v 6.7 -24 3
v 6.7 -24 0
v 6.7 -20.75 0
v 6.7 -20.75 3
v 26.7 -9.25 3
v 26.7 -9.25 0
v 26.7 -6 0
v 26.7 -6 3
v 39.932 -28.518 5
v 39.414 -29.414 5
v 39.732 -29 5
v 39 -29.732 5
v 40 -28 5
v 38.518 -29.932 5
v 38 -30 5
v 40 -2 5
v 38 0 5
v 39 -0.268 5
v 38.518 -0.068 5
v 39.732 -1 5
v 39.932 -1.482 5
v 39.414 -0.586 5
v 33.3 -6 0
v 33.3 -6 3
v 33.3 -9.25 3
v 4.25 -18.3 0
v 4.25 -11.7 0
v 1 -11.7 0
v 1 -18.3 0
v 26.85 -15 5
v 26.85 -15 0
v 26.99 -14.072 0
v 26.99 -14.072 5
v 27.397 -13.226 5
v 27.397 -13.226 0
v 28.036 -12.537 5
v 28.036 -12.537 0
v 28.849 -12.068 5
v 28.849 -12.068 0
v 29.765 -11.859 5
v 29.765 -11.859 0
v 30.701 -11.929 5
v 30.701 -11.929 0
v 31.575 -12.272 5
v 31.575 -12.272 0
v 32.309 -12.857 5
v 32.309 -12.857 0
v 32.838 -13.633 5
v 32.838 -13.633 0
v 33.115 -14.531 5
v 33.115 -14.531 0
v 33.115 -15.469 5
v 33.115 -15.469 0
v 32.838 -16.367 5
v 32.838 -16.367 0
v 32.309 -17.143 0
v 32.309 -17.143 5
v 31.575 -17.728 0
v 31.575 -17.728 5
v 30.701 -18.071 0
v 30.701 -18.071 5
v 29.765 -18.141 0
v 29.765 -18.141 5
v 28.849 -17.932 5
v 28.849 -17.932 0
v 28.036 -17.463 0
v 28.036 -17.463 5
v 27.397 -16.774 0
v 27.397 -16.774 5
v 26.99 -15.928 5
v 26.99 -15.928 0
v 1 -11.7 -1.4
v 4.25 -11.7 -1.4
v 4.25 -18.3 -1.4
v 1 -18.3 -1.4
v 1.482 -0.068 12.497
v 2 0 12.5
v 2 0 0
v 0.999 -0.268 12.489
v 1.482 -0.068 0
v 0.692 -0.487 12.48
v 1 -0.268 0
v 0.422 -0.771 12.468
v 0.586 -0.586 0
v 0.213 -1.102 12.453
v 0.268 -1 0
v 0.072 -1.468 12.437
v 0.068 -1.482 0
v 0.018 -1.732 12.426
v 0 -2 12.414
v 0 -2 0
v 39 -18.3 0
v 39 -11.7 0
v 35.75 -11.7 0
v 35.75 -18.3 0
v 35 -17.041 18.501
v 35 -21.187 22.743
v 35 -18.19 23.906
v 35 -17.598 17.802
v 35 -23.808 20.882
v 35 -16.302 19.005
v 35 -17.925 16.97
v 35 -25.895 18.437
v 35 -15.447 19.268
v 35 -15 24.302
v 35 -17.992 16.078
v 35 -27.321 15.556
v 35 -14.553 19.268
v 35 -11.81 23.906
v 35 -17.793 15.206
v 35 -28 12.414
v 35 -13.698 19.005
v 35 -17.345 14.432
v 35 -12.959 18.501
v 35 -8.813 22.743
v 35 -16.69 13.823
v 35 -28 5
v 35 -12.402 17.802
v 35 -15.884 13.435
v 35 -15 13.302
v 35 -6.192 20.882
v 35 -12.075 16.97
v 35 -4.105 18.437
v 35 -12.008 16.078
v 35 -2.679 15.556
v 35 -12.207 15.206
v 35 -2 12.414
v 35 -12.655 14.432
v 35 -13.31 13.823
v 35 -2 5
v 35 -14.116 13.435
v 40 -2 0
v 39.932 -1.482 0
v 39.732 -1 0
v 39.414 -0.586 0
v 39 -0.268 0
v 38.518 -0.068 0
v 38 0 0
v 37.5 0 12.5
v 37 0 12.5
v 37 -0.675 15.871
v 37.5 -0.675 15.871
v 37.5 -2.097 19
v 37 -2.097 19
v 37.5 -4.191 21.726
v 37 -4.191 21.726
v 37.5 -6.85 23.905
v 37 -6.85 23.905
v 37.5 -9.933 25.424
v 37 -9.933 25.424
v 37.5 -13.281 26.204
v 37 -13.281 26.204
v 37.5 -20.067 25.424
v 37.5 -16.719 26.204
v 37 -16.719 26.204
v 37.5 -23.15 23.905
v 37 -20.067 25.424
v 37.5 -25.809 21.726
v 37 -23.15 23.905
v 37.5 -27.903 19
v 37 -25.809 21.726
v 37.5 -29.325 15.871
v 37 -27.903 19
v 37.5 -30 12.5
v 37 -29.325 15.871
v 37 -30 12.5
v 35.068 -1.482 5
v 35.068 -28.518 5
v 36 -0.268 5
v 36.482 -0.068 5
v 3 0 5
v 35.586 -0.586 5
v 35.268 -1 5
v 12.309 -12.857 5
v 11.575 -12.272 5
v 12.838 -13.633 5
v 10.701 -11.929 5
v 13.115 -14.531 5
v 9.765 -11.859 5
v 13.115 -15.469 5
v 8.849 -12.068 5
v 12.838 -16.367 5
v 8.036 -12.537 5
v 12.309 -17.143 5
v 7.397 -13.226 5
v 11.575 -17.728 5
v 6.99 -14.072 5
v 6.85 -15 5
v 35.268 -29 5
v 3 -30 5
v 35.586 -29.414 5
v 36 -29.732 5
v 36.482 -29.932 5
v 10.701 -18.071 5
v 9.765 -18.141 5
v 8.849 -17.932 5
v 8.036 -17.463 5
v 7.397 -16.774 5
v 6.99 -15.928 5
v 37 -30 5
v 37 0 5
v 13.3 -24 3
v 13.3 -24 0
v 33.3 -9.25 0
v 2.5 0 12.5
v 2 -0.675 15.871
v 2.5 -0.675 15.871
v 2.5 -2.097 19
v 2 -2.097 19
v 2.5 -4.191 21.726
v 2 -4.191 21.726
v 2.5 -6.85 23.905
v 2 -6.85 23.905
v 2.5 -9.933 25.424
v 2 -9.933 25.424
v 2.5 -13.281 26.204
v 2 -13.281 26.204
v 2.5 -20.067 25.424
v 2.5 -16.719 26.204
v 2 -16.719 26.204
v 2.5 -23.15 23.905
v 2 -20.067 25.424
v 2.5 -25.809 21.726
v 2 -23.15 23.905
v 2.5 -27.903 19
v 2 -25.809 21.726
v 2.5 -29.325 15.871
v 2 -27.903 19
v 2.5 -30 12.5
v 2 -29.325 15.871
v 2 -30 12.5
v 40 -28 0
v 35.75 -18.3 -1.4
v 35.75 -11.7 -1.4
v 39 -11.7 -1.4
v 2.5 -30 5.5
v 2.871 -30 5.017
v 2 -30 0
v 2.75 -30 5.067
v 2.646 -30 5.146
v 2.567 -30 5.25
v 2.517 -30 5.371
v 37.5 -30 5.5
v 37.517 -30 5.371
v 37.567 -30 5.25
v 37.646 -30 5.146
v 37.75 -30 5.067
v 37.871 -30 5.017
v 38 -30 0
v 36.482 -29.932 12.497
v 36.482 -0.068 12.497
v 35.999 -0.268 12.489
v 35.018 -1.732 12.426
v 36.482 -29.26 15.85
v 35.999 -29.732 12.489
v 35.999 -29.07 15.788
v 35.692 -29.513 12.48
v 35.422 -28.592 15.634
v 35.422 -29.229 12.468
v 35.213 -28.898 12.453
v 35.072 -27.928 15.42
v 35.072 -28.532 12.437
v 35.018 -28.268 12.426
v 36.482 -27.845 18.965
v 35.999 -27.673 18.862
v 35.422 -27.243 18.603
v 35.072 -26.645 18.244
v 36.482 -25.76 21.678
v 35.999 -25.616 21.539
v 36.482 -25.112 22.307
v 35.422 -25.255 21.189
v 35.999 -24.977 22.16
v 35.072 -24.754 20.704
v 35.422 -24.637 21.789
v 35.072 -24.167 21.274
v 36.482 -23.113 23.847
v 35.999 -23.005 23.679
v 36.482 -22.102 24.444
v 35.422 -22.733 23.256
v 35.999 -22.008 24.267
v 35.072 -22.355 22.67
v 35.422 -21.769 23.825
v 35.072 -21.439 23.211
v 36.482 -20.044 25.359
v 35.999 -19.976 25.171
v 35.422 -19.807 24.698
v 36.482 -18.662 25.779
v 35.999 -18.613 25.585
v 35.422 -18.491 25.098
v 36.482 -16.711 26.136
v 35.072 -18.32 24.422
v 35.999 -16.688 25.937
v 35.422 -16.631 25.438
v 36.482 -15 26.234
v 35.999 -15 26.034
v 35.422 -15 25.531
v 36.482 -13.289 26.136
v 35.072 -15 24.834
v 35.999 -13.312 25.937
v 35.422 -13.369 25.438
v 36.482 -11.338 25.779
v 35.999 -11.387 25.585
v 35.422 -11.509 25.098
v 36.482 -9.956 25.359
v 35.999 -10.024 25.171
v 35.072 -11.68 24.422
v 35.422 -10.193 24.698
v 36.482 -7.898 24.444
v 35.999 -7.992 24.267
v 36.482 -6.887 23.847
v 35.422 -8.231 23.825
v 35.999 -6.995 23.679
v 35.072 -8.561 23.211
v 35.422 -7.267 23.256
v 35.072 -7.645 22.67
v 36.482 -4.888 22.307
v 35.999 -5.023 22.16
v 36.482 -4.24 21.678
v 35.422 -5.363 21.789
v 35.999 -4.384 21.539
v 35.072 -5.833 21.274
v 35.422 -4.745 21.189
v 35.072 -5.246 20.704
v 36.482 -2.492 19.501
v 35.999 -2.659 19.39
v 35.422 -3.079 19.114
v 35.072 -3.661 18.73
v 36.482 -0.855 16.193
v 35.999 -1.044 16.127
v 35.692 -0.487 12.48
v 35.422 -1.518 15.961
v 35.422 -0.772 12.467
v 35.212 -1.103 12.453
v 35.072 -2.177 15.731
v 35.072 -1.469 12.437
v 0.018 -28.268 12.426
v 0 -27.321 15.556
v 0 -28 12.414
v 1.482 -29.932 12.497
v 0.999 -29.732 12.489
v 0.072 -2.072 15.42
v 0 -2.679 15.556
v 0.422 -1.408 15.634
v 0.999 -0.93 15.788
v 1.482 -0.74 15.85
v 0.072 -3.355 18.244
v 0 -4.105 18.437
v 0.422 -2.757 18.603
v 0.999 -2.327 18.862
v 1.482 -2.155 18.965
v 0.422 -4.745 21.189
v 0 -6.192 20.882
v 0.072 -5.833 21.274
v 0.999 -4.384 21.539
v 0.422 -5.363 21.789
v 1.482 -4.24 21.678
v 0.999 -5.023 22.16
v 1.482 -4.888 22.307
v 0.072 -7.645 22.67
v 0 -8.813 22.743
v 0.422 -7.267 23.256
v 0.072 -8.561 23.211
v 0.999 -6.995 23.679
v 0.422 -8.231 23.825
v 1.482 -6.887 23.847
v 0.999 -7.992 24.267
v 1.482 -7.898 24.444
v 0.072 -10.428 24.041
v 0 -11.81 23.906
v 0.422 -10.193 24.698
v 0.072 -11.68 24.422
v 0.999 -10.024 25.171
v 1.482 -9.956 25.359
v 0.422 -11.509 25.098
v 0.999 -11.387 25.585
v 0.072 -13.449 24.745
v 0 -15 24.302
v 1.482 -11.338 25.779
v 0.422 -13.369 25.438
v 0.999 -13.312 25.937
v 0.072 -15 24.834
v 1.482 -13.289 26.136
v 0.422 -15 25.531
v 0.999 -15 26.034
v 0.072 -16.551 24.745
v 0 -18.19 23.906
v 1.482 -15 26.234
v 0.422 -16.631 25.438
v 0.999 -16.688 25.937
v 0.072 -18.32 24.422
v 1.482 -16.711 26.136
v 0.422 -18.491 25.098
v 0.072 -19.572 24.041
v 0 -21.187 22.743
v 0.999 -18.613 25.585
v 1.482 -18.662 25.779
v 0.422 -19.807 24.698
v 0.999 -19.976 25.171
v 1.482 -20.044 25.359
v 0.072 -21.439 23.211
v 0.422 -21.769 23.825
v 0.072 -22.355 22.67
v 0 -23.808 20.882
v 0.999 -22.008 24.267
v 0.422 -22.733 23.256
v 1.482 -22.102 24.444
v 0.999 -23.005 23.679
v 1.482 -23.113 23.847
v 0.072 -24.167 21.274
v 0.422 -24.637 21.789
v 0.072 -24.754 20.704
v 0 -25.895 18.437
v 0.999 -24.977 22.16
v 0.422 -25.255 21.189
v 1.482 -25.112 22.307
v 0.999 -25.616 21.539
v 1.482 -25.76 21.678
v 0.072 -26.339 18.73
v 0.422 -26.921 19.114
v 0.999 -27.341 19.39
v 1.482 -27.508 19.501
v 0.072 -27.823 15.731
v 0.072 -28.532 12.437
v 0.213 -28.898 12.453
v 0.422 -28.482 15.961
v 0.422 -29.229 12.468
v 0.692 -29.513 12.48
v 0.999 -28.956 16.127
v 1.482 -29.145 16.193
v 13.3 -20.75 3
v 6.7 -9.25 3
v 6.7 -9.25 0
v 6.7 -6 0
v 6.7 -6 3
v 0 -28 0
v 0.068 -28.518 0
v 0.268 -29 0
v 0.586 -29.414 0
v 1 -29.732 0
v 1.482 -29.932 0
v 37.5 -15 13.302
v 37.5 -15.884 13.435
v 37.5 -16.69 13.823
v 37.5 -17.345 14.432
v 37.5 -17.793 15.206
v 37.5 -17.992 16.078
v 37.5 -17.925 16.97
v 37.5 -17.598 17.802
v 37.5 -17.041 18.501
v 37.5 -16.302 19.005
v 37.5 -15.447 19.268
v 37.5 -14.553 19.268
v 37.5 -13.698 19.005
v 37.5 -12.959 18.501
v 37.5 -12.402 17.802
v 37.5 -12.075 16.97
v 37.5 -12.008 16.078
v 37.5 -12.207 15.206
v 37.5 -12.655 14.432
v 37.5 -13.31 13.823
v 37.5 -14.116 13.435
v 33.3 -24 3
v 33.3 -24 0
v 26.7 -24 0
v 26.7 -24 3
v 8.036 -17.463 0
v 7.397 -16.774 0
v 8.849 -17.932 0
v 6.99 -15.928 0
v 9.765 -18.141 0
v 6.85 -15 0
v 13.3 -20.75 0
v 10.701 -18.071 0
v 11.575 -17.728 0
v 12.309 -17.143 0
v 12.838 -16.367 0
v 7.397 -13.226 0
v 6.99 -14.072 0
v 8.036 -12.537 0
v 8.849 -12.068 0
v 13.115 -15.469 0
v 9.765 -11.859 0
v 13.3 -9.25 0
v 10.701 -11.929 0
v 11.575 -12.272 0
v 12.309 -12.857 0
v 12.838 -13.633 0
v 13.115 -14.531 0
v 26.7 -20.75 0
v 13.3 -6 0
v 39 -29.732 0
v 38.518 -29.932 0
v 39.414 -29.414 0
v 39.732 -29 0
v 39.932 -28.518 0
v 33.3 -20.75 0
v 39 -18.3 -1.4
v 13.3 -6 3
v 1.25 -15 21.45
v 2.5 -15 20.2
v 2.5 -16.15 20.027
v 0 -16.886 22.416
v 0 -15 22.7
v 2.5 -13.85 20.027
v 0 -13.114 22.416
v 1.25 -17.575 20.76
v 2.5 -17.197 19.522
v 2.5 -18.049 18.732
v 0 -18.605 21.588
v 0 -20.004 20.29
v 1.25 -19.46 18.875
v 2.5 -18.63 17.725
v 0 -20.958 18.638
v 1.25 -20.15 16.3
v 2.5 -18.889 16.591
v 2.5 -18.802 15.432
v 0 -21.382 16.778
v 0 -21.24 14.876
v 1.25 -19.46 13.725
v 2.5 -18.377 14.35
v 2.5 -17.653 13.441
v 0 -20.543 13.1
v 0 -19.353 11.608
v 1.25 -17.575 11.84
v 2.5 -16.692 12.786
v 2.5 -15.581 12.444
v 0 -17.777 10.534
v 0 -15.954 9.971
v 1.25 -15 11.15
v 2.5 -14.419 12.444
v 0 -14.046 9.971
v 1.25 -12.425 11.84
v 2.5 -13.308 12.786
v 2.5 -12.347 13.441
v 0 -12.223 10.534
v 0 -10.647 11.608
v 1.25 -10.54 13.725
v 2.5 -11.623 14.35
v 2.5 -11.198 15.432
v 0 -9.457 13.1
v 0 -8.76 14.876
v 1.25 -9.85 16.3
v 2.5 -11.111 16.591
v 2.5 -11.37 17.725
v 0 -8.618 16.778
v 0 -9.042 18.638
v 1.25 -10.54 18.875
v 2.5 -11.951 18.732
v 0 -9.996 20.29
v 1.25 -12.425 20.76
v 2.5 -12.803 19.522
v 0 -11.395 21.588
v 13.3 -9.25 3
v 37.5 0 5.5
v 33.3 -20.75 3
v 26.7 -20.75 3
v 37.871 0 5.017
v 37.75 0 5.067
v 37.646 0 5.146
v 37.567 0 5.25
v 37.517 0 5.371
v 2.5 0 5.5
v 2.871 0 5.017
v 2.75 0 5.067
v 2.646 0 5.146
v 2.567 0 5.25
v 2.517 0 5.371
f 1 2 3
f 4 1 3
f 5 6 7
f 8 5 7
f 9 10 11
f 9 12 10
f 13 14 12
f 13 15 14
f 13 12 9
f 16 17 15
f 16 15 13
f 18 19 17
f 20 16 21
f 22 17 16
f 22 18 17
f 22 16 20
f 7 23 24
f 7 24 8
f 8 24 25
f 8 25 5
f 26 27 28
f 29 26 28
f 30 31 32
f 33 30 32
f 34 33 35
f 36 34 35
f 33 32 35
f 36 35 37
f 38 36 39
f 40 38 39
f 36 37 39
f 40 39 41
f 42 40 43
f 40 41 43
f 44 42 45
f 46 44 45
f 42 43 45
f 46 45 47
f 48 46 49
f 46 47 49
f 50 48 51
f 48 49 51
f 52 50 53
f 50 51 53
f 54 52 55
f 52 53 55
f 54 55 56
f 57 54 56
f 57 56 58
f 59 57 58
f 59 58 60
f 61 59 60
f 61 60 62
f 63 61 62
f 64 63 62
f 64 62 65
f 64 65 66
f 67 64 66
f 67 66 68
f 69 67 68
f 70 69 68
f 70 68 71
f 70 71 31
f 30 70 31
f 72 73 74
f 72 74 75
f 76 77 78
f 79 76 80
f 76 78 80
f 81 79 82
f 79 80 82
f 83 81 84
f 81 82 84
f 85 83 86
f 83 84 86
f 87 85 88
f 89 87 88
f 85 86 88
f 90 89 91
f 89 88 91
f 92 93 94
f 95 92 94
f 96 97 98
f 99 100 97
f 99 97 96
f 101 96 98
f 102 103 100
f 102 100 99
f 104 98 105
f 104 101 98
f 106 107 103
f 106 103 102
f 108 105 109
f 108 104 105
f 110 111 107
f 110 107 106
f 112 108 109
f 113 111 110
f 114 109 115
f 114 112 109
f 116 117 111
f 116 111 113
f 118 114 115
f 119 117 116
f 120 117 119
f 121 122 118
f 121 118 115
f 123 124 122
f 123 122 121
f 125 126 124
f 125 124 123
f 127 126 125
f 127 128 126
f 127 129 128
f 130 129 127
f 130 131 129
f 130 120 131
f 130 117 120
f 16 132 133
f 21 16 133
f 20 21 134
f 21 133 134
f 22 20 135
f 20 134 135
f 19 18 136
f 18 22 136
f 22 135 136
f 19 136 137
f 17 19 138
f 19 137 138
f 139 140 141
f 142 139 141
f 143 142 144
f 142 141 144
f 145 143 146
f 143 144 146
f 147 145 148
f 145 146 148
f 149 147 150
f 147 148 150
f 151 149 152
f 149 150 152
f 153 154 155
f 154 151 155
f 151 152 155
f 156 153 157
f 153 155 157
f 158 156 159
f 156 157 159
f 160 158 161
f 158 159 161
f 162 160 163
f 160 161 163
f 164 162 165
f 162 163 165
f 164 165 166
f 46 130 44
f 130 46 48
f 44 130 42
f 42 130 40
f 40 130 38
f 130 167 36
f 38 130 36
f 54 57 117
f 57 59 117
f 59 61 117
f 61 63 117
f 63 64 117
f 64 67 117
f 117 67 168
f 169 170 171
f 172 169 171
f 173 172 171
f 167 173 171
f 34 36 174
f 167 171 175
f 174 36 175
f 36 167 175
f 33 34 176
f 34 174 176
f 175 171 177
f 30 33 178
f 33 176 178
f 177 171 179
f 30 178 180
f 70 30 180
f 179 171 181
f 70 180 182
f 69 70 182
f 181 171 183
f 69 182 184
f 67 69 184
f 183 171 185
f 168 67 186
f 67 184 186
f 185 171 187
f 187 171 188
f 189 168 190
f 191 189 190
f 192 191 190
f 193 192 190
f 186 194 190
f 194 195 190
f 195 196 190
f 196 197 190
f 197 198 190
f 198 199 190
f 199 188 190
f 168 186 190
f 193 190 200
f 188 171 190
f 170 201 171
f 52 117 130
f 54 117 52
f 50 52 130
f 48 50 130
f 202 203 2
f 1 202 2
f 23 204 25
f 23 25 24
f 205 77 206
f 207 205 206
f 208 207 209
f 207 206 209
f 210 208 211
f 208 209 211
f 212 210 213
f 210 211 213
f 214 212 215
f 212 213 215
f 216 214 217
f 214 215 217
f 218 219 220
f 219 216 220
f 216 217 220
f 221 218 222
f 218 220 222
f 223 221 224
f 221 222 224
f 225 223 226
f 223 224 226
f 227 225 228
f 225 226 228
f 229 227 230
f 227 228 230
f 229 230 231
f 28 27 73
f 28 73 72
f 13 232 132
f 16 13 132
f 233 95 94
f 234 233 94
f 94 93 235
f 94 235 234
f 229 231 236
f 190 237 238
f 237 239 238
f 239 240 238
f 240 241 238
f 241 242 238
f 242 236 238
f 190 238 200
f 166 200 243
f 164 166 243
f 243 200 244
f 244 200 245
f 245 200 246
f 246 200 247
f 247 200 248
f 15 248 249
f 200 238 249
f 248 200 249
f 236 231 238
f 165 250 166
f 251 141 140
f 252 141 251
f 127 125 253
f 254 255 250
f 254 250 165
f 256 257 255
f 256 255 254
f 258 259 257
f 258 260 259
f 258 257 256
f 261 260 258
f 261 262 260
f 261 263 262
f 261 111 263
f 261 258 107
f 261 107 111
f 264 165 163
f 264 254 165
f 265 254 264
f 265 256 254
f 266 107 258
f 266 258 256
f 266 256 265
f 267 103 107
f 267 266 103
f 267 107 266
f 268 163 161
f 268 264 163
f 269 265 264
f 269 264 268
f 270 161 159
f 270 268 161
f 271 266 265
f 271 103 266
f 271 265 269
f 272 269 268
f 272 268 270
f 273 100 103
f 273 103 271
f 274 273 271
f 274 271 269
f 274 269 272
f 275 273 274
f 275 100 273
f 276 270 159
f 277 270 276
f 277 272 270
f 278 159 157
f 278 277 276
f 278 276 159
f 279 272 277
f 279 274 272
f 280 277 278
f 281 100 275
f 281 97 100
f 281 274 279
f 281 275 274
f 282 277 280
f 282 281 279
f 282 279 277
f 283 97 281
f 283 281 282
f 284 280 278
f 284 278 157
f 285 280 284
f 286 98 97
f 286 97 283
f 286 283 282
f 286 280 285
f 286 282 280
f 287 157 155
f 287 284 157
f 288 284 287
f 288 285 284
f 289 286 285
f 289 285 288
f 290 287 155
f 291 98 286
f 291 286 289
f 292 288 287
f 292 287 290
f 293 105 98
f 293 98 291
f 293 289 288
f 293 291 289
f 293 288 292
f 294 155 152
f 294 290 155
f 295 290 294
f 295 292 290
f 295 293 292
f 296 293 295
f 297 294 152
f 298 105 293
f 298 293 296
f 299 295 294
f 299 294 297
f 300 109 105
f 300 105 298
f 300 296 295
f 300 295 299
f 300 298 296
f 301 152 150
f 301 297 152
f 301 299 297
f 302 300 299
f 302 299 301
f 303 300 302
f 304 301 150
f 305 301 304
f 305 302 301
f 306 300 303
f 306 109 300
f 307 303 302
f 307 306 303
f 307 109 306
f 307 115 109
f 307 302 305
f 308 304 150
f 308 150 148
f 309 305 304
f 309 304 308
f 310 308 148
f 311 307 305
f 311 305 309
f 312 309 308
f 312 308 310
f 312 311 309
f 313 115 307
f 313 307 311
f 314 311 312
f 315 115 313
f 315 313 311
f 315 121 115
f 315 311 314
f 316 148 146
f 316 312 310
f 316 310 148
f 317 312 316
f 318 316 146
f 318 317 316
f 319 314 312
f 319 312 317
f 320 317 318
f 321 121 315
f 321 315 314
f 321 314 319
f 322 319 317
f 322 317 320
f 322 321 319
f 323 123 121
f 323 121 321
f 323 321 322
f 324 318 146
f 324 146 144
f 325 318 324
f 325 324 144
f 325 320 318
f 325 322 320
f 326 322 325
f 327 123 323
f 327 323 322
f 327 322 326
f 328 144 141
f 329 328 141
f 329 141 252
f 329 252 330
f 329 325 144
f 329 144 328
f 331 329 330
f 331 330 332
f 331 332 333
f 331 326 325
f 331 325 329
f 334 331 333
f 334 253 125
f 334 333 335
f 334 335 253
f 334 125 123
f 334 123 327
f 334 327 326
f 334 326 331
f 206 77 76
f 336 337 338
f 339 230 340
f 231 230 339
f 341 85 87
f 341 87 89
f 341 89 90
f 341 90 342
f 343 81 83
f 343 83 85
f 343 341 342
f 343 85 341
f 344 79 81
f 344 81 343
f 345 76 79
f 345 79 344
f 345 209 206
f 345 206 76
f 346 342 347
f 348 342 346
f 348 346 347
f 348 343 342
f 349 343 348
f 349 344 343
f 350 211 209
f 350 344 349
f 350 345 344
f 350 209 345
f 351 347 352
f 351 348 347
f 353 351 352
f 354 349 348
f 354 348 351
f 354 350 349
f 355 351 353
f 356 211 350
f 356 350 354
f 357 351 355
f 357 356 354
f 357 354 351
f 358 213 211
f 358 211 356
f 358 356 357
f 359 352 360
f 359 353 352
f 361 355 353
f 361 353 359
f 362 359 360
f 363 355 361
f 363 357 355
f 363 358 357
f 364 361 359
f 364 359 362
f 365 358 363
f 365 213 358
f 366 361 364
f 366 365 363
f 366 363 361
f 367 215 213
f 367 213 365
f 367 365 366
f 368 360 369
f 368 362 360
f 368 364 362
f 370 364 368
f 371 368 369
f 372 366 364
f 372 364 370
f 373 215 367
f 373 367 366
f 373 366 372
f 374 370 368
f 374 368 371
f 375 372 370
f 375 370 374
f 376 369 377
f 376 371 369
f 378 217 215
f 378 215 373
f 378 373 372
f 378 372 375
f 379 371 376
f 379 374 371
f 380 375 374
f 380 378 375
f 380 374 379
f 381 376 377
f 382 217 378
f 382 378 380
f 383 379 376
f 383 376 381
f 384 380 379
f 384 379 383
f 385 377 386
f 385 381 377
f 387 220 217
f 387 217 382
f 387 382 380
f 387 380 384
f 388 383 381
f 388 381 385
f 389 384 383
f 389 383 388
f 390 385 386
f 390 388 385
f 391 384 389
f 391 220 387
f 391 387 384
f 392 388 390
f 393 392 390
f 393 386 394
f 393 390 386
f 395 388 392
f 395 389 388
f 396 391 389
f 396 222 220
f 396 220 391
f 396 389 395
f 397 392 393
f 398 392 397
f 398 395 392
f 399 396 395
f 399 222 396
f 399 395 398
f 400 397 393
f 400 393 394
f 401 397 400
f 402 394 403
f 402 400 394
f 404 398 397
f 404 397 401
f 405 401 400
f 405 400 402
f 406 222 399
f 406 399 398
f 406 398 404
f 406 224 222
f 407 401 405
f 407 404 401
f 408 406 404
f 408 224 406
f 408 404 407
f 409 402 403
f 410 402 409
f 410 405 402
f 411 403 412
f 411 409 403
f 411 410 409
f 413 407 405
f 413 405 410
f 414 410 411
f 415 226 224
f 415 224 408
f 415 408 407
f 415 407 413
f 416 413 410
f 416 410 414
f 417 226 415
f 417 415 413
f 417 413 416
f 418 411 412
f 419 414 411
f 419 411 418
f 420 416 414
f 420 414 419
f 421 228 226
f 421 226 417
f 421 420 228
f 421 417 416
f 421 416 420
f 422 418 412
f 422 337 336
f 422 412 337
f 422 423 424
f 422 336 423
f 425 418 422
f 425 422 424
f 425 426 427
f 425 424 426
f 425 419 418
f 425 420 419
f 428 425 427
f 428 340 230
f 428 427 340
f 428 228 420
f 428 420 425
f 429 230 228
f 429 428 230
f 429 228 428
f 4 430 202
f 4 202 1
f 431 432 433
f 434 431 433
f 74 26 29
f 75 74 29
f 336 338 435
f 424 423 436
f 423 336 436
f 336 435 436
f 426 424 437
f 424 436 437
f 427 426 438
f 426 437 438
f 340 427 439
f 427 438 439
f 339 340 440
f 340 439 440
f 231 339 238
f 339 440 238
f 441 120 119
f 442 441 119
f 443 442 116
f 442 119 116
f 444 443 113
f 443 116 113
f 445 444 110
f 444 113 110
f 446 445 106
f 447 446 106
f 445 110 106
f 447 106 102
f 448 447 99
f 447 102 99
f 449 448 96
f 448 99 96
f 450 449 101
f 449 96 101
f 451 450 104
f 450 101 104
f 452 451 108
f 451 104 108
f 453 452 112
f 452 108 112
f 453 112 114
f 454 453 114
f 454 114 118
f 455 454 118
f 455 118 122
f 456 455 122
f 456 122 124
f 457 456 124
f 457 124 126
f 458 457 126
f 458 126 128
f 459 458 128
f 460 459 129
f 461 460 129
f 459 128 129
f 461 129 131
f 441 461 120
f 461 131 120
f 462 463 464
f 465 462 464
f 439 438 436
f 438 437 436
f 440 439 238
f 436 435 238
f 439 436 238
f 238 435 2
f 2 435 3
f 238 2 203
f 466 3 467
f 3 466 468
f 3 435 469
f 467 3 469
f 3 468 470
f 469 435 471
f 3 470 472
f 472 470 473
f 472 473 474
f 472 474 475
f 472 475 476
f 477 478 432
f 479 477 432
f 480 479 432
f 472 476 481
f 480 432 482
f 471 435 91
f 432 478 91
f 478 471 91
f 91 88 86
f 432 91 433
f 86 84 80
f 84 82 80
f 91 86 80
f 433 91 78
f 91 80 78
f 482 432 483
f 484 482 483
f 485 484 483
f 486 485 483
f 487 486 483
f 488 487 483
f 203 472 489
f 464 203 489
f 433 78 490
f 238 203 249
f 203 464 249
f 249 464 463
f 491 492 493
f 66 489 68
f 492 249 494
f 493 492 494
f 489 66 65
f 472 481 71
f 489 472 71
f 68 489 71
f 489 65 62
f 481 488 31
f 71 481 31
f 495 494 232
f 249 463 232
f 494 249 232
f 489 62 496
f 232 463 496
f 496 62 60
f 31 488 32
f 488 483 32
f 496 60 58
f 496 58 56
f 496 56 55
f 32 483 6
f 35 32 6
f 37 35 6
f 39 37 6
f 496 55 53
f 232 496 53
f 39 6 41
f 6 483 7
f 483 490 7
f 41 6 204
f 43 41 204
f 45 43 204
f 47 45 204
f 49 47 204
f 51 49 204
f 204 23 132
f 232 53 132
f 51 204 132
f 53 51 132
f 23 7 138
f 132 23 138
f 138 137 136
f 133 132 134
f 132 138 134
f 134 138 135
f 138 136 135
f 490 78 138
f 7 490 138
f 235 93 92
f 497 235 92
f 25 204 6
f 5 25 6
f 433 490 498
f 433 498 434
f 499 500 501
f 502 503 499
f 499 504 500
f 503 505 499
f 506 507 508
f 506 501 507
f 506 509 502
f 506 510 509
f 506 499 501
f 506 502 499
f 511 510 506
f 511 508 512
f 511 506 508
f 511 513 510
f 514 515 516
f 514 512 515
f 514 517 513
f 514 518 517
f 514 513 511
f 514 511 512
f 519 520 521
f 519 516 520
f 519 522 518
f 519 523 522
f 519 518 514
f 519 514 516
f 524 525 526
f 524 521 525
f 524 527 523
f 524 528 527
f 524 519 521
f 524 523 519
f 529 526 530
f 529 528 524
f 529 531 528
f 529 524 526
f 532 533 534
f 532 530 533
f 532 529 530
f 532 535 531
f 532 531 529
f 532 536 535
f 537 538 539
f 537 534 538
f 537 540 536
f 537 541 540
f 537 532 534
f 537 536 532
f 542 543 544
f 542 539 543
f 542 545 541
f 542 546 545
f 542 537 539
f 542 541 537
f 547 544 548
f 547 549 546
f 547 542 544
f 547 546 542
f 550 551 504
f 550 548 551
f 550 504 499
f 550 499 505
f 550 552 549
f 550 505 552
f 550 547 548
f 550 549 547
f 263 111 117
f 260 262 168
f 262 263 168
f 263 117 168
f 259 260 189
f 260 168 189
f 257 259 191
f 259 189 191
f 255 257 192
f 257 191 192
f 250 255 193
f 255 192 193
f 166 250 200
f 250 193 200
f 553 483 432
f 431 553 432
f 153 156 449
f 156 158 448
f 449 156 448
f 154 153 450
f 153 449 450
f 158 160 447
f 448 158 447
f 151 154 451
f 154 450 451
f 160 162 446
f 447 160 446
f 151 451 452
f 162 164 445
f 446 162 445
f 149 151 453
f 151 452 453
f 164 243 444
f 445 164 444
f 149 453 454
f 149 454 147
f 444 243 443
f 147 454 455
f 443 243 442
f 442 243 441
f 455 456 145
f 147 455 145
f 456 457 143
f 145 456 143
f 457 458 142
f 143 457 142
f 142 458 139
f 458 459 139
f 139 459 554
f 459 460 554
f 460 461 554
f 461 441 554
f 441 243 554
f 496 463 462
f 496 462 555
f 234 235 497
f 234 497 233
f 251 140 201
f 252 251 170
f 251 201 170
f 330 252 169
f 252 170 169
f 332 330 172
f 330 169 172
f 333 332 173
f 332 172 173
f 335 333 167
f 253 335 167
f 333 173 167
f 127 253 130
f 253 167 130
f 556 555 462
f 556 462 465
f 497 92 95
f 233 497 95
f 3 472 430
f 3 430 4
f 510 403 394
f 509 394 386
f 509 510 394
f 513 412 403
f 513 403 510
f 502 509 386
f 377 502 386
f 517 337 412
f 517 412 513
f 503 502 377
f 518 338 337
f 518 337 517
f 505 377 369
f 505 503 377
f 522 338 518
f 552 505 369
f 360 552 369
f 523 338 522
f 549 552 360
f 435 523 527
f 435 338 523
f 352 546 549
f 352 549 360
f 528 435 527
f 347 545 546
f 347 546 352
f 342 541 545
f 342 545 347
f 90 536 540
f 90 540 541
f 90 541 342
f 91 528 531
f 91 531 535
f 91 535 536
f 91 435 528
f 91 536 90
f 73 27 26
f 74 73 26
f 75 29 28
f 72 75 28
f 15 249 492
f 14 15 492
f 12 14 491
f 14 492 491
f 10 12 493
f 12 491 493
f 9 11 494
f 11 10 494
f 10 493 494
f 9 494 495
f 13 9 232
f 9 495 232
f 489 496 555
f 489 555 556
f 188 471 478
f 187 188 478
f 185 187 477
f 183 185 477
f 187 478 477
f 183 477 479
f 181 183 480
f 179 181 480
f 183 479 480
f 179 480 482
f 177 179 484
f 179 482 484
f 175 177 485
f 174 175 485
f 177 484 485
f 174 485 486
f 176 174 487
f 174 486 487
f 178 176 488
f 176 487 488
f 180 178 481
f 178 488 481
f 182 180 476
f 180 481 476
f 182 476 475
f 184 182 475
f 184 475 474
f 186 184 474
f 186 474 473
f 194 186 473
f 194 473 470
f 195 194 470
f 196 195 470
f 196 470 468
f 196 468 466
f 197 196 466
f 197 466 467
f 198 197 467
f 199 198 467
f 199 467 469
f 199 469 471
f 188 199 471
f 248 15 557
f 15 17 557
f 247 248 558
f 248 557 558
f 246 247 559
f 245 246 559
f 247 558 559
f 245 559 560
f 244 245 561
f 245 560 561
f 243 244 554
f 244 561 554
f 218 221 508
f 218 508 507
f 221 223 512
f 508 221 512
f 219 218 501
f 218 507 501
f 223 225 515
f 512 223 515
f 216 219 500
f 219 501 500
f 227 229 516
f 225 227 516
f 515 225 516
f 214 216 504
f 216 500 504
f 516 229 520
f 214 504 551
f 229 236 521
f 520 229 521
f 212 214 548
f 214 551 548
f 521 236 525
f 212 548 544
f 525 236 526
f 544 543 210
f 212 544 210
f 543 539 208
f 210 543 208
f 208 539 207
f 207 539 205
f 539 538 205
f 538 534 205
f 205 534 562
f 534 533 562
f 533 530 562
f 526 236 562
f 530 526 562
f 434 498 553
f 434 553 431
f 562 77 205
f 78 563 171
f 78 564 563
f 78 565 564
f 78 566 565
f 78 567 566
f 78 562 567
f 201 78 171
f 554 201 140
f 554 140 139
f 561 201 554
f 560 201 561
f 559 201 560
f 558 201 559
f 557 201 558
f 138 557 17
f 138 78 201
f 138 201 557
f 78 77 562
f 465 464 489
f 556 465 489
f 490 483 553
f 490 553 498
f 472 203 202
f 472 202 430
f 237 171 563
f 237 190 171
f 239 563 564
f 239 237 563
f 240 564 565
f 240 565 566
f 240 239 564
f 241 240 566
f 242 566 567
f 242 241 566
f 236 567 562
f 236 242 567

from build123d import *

# Parameters (mm, degrees)
SKETCH_1_W          = 40
SKETCH_1_H          = 30
EXTRUDE_1_DEPTH     = 5
SKETCH_2_W          = 2.5
SKETCH_2_H          = 30
EXTRUDE_2_DEPTH     = 27.5
SKETCH_3_W          = 6.6
SKETCH_3_H          = 3.25
CUT_EXTRUDE_1_DEPTH = 3
CUT_EXTRUDE_2_DEPTH = 58.063561053
SKETCH_3_4_W        = 3.25
SKETCH_3_4_H        = 3.3
EXTRUDE_3_DEPTH     = 1.4
SKETCH_4_W          = 2.5
SKETCH_4_H          = 30
EXTRUDE_4_DEPTH     = 22.5
CUT_EXTRUDE_3_DEPTH = 58.063561053
SKETCH_8_W          = 3
SKETCH_8_H          = 2.501
FILLET_3_R          = 0.5
FILLET_4_R          = 2


with BuildPart() as part:
    # 草图1 → 凸台-拉伸1 (new body)
    with BuildSketch(Plane.XY):
        with Locations((20, -15)):
            Rectangle(SKETCH_1_W, SKETCH_1_H)
    extrude(amount=EXTRUDE_1_DEPTH)

    # 草图2 → 凸台-拉伸2 (add)
    with BuildSketch(Plane.XY):
        with Locations((1.25, -15)):
            Rectangle(SKETCH_2_W, SKETCH_2_H)
    extrude(amount=EXTRUDE_2_DEPTH)

    # 草图3 → 切除-拉伸1 (cut)
    with BuildSketch(Plane(origin=(0, 0, 0), x_dir=(-1, 0, 0), z_dir=(0, 0, -1))):
        with Locations((-30, -7.625)):
            Rectangle(SKETCH_3_W, SKETCH_3_H)
        with Locations((-30, -22.375)):
            Rectangle(SKETCH_3_W, SKETCH_3_H)
        with Locations((-10, -22.375)):
            Rectangle(SKETCH_3_W, SKETCH_3_H)
        with Locations((-10, -7.625)):
            Rectangle(SKETCH_3_W, SKETCH_3_H)
    extrude(amount=-CUT_EXTRUDE_1_DEPTH, mode=Mode.SUBTRACT)

    # 草图3<3> → 切除-拉伸2 (cut, through all)
    with BuildSketch(Plane(origin=(0, 0, 0), x_dir=(-1, 0, 0), z_dir=(0, 0, -1))):
        with BuildLine():
            ThreePointArc((-33.15, -15), (-30, -18.15), (-26.85, -15))
            Line((-26.85, -15), (-33.15, -15))
        make_face()
        with BuildLine():
            Line((-33.15, -15), (-26.85, -15))
            ThreePointArc((-26.85, -15), (-30, -11.85), (-33.15, -15))
        make_face()
        with BuildLine():
            ThreePointArc((-13.15, -15), (-10, -18.15), (-6.85, -15))
            Line((-6.85, -15), (-13.15, -15))
        make_face()
        with BuildLine():
            Line((-13.15, -15), (-6.85, -15))
            ThreePointArc((-6.85, -15), (-10, -11.85), (-13.15, -15))
        make_face()
    extrude(amount=-CUT_EXTRUDE_2_DEPTH, mode=Mode.SUBTRACT)

    # 草图4 → 凸台-拉伸4 (add)
    with BuildSketch(Plane.XY.offset(5)):
        with Locations((36.25, -15)):
            Rectangle(SKETCH_4_W, SKETCH_4_H)
    extrude(amount=EXTRUDE_4_DEPTH)

    # 草图5 → 切除-拉伸3 (cut, through all)
    with BuildSketch(Plane.ZY):
        with BuildLine():
            Line((27.5, 0), (12.5, 0))
            ThreePointArc((12.5, 0), (26.301993223, -15), (12.5, -30))
            Line((12.5, -30), (27.5, -30))
            Line((27.5, -30), (27.5, 0))
        make_face()
    extrude(amount=-CUT_EXTRUDE_3_DEPTH, mode=Mode.SUBTRACT)

    # 草图8 → Hole Wizard M6 _1 (revolve, cut)
    with BuildSketch(Plane(origin=(37.5, -15, 16.301993223), x_dir=(0, 0, -1), z_dir=(0, 1, 0))):
        with Locations((1.5, 1.2505)):
            Rectangle(SKETCH_8_W, SKETCH_8_H)
    revolve(axis=Axis((43.85, -15, 16.301993223), (-1, 0, 0)), mode=Mode.SUBTRACT)

    # 草图10 → Hole Wizard M6 _1 2 (revolve, cut)
    with BuildSketch(Plane(origin=(0, -15, 16.3), x_dir=(0, 0, 1), z_dir=(0, 1, 0))):
        Polygon((0, 0), (0, 2.501), (3.3, 2.501), (3.3, 3.1), (6.4, 0), align=None)
    revolve(axis=Axis((-6.35, -15, 16.3), (1, 0, 0)), mode=Mode.SUBTRACT)

    # 圆角3
    fillet_3_edges = [part.edges().sort_by_distance(p)[0] for p in [
        (2.5, -15, 5),
        (37.5, -15, 5),
    ]]
    fillet(fillet_3_edges, radius=FILLET_3_R)

    # 圆角4
    # the kernel refuses this fillet: 2 mm, written as the material it takes off along each edge
    with BuildSketch(Plane(origin=(35, -30, 5), x_dir=(0, 1, 0), z_dir=(0, 0, 1)), Plane(origin=(35, 0, 5), x_dir=(1, 0, 0), z_dir=(0, 0, 1))) as fillet_4_piece_1:
        with BuildLine():
            CenterArc((FILLET_4_R, -FILLET_4_R), FILLET_4_R, 90, 90)
            Line((0, -FILLET_4_R), (-FILLET_4_R * 0.02, -FILLET_4_R))
            Line((-FILLET_4_R * 0.02, -FILLET_4_R), (-FILLET_4_R * 0.02, FILLET_4_R * 0.02))
            Line((-FILLET_4_R * 0.02, FILLET_4_R * 0.02), (FILLET_4_R, FILLET_4_R * 0.02))
            Line((FILLET_4_R, FILLET_4_R * 0.02), (FILLET_4_R, 0))
        make_face()
    extrude(amount=9.5, mode=Mode.SUBTRACT)
    with BuildSketch(Plane(origin=(0, 0, -2), x_dir=(1, 0, 0), z_dir=(0, 0, 1)), Plane(origin=(0, -30, -2), x_dir=(0, 1, 0), z_dir=(0, 0, 1))) as fillet_4_piece_2:
        with BuildLine():
            CenterArc((FILLET_4_R, -FILLET_4_R), FILLET_4_R, 90, 90)
            Line((0, -FILLET_4_R), (-FILLET_4_R * 0.02, -FILLET_4_R))
            Line((-FILLET_4_R * 0.02, -FILLET_4_R), (-FILLET_4_R * 0.02, FILLET_4_R * 0.02))
            Line((-FILLET_4_R * 0.02, FILLET_4_R * 0.02), (FILLET_4_R, FILLET_4_R * 0.02))
            Line((FILLET_4_R, FILLET_4_R * 0.02), (FILLET_4_R, 0))
        make_face()
    extrude(amount=16.5, mode=Mode.SUBTRACT)
    with BuildSketch(Plane(origin=(35, -15, 11.25), x_dir=(0, -0.998754097024609, -0.04990244158914389), z_dir=(0, 0.04990244158914389, -0.998754097024609))) as fillet_4_piece_3:
        with BuildLine():
            CenterArc((15.051993223 - FILLET_4_R, -FILLET_4_R), FILLET_4_R, 0, 90)
            Line((15.051993223 - FILLET_4_R, 0), (15.051993223 - FILLET_4_R, FILLET_4_R * 0.02))
            Line((15.051993223 - FILLET_4_R, FILLET_4_R * 0.02), (15.051993223 + FILLET_4_R * 0.02, FILLET_4_R * 0.02))
            Line((15.051993223 + FILLET_4_R * 0.02, FILLET_4_R * 0.02), (15.051993223 + FILLET_4_R * 0.02, -FILLET_4_R))
            Line((15.051993223 + FILLET_4_R * 0.02, -FILLET_4_R), (15.051993223, -FILLET_4_R))
        make_face()
    revolve(axis=Axis((35, -15, 11.25), (-1, 0, 0)), revolution_arc=185.720774622, mode=Mode.SUBTRACT)
    with BuildSketch(Plane(origin=(0, -15, 11.25), x_dir=(0, 0.9987540970246119, -0.04990244158908723), z_dir=(0, -0.04990244158908723, -0.9987540970246119))) as fillet_4_piece_4:
        with BuildLine():
            CenterArc((15.051993223 - FILLET_4_R, FILLET_4_R), FILLET_4_R, 270, 90)
            Line((15.051993223, FILLET_4_R), (15.051993223 + FILLET_4_R * 0.02, FILLET_4_R))
            Line((15.051993223 + FILLET_4_R * 0.02, FILLET_4_R), (15.051993223 + FILLET_4_R * 0.02, -FILLET_4_R * 0.02))
            Line((15.051993223 + FILLET_4_R * 0.02, -FILLET_4_R * 0.02), (15.051993223 - FILLET_4_R, -FILLET_4_R * 0.02))
            Line((15.051993223 - FILLET_4_R, -FILLET_4_R * 0.02), (15.051993223 - FILLET_4_R, 0))
        make_face()
    revolve(axis=Axis((0, -15, 11.25), (1, 0, 0)), revolution_arc=185.720774622, mode=Mode.SUBTRACT)
    with BuildSketch(Plane(origin=(40, 0, -2), x_dir=(-1, 0, 0), z_dir=(0, 0, 1)), Plane(origin=(40, -30, -2), x_dir=(0, 1, 0), z_dir=(0, 0, 1))) as fillet_4_piece_5:
        with BuildLine():
            CenterArc((FILLET_4_R, FILLET_4_R), FILLET_4_R, 180, 90)
            Line((0, FILLET_4_R), (-FILLET_4_R * 0.02, FILLET_4_R))
            Line((-FILLET_4_R * 0.02, FILLET_4_R), (-FILLET_4_R * 0.02, -FILLET_4_R * 0.02))
            Line((-FILLET_4_R * 0.02, -FILLET_4_R * 0.02), (FILLET_4_R, -FILLET_4_R * 0.02))
            Line((FILLET_4_R, -FILLET_4_R * 0.02), (FILLET_4_R, 0))
        make_face()
    extrude(amount=9, mode=Mode.SUBTRACT)


with BuildPart() as body_2:
    # 草图3<4> → 凸台-拉伸3 (new body)
    with BuildSketch(Plane(origin=(0, 0, 0), x_dir=(-1, 0, 0), z_dir=(0, 0, -1))):
        with Locations((-37.375, -13.35)):
            Rectangle(SKETCH_3_4_W, SKETCH_3_4_H)
        with Locations((-37.375, -16.65)):
            Rectangle(SKETCH_3_4_W, SKETCH_3_4_H)
        with Locations((-2.625, -13.35)):
            Rectangle(SKETCH_3_4_W, SKETCH_3_4_H)
        with Locations((-2.625, -16.65)):
            Rectangle(SKETCH_3_4_W, SKETCH_3_4_H)
    extrude(amount=EXTRUDE_3_DEPTH)


solid = Compound([part.part, body_2.part])
